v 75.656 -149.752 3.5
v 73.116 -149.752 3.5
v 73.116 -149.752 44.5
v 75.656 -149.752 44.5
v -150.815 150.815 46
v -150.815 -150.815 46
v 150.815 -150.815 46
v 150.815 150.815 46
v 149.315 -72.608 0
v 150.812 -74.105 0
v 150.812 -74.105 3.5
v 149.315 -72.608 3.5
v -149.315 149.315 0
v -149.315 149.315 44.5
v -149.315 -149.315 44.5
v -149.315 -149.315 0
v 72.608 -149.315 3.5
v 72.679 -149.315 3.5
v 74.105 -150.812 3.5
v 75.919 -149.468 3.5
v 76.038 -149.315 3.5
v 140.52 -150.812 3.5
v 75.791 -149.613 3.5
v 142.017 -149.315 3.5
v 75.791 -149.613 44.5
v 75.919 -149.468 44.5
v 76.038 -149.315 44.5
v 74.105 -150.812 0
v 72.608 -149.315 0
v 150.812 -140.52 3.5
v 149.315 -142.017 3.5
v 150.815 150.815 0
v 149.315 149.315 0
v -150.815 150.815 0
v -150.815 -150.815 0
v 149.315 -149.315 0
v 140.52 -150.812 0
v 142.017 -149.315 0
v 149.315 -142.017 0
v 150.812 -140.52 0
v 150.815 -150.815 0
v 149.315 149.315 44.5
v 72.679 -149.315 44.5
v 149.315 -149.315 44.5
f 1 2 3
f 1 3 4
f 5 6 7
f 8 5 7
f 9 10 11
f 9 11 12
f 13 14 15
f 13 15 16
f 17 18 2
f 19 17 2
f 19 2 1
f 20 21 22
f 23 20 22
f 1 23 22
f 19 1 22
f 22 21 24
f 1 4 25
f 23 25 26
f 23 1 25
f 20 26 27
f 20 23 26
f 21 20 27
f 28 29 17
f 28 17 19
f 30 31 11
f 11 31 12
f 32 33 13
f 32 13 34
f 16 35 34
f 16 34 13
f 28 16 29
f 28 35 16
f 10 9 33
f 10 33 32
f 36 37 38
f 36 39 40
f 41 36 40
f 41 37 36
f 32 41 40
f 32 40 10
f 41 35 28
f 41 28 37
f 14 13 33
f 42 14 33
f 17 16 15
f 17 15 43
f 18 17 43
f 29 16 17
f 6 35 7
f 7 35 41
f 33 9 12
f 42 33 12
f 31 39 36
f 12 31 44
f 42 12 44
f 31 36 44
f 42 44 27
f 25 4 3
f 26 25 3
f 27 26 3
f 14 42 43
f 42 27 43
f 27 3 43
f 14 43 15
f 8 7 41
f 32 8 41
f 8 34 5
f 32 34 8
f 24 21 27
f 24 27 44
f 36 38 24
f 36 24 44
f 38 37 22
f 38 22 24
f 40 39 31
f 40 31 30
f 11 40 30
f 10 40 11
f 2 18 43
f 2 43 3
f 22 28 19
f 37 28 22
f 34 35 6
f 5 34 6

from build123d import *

# Parameters (mm, degrees)
THICKEN1_START       = -150.815
THICKEN1_DEPTH       = 301.63
THICKEN1_2_OUTLINE_W = 298.63
THICKEN1_2_OUTLINE_H = 44.5
THICKEN1_2_DEPTH     = 1.5
THICKEN1_START_2     = 149.315
THICKEN1_3_OUTLINE_W = 298.63
THICKEN1_3_OUTLINE_H = 44.5
THICKEN1_3_DEPTH     = 1.5
CUT_EXTRUDE1_DEPTH   = 3.5
CUT_EXTRUDE2_DEPTH   = 44.5


# Read off the part's stored shape, not the designer's step: Thicken1
with BuildPart() as part:
    # Thicken1 outline → Thicken1 (new body)
    with BuildSketch(Plane(origin=(0, 0, 0), x_dir=(1, 0, 0), z_dir=(0, 1, 0)).offset(THICKEN1_START)):
        Polygon((-150.815, -46), (150.815, -46), (150.815, 0), (149.315, 0), (149.315, -44.5), (-149.315, -44.5), (-149.315, 0), (-150.815, 0), align=None)
    extrude(amount=THICKEN1_DEPTH)

    # Thicken1 2 outline → Thicken1 2 (add)
    with BuildSketch(Plane(origin=(0, 0, 0), x_dir=(1, 0, 0), z_dir=(0, 1, 0)).offset(THICKEN1_START)):
        with Locations((0, -22.25)):
            Rectangle(THICKEN1_2_OUTLINE_W, THICKEN1_2_OUTLINE_H)
    extrude(amount=THICKEN1_2_DEPTH)

    # Thicken1 3 outline → Thicken1 3 (add)
    with BuildSketch(Plane(origin=(0, 0, 0), x_dir=(1, 0, 0), z_dir=(0, 1, 0)).offset(THICKEN1_START_2)):
        with Locations((0, -22.25)):
            Rectangle(THICKEN1_3_OUTLINE_W, THICKEN1_3_OUTLINE_H)
    extrude(amount=THICKEN1_3_DEPTH)

    # Sketch2 → Cut-Extrude1 (cut)
    with BuildSketch(Plane.XY):
        Polygon((147.166053391, -70.458946609), (145.751839828, -71.873160172), (148.8125, -74.933820344), (148.8125, -139.691179656), (139.691179656, -148.8125), (74.933820344, -148.8125), (71.873160172, -145.751839828), (70.458946609, -147.166053391), (74.105393219, -150.8125), (140.519606781, -150.8125), (150.8125, -140.519606781), (150.8125, -74.105393219), align=None)
    extrude(amount=CUT_EXTRUDE1_DEPTH, mode=Mode.SUBTRACT)

    # Sketch3 → Cut-Extrude2 (cut)
    with BuildSketch(Plane.XY):
        with BuildLine():
            Line((73.180697047, -143.737196171), (70.140927125, -146.776966094))
            Line((70.140927125, -146.776966094), (73.115800859, -149.751839828))
            Line((73.115800859, -149.751839828), (75.655768509, -149.751839828))
            ThreePointArc((75.655768509, -149.751839828), (76.458227012, -145.905044907), (73.180697047, -143.737196171))
        make_face()
    extrude(amount=CUT_EXTRUDE2_DEPTH, mode=Mode.SUBTRACT)


solid = part.part
